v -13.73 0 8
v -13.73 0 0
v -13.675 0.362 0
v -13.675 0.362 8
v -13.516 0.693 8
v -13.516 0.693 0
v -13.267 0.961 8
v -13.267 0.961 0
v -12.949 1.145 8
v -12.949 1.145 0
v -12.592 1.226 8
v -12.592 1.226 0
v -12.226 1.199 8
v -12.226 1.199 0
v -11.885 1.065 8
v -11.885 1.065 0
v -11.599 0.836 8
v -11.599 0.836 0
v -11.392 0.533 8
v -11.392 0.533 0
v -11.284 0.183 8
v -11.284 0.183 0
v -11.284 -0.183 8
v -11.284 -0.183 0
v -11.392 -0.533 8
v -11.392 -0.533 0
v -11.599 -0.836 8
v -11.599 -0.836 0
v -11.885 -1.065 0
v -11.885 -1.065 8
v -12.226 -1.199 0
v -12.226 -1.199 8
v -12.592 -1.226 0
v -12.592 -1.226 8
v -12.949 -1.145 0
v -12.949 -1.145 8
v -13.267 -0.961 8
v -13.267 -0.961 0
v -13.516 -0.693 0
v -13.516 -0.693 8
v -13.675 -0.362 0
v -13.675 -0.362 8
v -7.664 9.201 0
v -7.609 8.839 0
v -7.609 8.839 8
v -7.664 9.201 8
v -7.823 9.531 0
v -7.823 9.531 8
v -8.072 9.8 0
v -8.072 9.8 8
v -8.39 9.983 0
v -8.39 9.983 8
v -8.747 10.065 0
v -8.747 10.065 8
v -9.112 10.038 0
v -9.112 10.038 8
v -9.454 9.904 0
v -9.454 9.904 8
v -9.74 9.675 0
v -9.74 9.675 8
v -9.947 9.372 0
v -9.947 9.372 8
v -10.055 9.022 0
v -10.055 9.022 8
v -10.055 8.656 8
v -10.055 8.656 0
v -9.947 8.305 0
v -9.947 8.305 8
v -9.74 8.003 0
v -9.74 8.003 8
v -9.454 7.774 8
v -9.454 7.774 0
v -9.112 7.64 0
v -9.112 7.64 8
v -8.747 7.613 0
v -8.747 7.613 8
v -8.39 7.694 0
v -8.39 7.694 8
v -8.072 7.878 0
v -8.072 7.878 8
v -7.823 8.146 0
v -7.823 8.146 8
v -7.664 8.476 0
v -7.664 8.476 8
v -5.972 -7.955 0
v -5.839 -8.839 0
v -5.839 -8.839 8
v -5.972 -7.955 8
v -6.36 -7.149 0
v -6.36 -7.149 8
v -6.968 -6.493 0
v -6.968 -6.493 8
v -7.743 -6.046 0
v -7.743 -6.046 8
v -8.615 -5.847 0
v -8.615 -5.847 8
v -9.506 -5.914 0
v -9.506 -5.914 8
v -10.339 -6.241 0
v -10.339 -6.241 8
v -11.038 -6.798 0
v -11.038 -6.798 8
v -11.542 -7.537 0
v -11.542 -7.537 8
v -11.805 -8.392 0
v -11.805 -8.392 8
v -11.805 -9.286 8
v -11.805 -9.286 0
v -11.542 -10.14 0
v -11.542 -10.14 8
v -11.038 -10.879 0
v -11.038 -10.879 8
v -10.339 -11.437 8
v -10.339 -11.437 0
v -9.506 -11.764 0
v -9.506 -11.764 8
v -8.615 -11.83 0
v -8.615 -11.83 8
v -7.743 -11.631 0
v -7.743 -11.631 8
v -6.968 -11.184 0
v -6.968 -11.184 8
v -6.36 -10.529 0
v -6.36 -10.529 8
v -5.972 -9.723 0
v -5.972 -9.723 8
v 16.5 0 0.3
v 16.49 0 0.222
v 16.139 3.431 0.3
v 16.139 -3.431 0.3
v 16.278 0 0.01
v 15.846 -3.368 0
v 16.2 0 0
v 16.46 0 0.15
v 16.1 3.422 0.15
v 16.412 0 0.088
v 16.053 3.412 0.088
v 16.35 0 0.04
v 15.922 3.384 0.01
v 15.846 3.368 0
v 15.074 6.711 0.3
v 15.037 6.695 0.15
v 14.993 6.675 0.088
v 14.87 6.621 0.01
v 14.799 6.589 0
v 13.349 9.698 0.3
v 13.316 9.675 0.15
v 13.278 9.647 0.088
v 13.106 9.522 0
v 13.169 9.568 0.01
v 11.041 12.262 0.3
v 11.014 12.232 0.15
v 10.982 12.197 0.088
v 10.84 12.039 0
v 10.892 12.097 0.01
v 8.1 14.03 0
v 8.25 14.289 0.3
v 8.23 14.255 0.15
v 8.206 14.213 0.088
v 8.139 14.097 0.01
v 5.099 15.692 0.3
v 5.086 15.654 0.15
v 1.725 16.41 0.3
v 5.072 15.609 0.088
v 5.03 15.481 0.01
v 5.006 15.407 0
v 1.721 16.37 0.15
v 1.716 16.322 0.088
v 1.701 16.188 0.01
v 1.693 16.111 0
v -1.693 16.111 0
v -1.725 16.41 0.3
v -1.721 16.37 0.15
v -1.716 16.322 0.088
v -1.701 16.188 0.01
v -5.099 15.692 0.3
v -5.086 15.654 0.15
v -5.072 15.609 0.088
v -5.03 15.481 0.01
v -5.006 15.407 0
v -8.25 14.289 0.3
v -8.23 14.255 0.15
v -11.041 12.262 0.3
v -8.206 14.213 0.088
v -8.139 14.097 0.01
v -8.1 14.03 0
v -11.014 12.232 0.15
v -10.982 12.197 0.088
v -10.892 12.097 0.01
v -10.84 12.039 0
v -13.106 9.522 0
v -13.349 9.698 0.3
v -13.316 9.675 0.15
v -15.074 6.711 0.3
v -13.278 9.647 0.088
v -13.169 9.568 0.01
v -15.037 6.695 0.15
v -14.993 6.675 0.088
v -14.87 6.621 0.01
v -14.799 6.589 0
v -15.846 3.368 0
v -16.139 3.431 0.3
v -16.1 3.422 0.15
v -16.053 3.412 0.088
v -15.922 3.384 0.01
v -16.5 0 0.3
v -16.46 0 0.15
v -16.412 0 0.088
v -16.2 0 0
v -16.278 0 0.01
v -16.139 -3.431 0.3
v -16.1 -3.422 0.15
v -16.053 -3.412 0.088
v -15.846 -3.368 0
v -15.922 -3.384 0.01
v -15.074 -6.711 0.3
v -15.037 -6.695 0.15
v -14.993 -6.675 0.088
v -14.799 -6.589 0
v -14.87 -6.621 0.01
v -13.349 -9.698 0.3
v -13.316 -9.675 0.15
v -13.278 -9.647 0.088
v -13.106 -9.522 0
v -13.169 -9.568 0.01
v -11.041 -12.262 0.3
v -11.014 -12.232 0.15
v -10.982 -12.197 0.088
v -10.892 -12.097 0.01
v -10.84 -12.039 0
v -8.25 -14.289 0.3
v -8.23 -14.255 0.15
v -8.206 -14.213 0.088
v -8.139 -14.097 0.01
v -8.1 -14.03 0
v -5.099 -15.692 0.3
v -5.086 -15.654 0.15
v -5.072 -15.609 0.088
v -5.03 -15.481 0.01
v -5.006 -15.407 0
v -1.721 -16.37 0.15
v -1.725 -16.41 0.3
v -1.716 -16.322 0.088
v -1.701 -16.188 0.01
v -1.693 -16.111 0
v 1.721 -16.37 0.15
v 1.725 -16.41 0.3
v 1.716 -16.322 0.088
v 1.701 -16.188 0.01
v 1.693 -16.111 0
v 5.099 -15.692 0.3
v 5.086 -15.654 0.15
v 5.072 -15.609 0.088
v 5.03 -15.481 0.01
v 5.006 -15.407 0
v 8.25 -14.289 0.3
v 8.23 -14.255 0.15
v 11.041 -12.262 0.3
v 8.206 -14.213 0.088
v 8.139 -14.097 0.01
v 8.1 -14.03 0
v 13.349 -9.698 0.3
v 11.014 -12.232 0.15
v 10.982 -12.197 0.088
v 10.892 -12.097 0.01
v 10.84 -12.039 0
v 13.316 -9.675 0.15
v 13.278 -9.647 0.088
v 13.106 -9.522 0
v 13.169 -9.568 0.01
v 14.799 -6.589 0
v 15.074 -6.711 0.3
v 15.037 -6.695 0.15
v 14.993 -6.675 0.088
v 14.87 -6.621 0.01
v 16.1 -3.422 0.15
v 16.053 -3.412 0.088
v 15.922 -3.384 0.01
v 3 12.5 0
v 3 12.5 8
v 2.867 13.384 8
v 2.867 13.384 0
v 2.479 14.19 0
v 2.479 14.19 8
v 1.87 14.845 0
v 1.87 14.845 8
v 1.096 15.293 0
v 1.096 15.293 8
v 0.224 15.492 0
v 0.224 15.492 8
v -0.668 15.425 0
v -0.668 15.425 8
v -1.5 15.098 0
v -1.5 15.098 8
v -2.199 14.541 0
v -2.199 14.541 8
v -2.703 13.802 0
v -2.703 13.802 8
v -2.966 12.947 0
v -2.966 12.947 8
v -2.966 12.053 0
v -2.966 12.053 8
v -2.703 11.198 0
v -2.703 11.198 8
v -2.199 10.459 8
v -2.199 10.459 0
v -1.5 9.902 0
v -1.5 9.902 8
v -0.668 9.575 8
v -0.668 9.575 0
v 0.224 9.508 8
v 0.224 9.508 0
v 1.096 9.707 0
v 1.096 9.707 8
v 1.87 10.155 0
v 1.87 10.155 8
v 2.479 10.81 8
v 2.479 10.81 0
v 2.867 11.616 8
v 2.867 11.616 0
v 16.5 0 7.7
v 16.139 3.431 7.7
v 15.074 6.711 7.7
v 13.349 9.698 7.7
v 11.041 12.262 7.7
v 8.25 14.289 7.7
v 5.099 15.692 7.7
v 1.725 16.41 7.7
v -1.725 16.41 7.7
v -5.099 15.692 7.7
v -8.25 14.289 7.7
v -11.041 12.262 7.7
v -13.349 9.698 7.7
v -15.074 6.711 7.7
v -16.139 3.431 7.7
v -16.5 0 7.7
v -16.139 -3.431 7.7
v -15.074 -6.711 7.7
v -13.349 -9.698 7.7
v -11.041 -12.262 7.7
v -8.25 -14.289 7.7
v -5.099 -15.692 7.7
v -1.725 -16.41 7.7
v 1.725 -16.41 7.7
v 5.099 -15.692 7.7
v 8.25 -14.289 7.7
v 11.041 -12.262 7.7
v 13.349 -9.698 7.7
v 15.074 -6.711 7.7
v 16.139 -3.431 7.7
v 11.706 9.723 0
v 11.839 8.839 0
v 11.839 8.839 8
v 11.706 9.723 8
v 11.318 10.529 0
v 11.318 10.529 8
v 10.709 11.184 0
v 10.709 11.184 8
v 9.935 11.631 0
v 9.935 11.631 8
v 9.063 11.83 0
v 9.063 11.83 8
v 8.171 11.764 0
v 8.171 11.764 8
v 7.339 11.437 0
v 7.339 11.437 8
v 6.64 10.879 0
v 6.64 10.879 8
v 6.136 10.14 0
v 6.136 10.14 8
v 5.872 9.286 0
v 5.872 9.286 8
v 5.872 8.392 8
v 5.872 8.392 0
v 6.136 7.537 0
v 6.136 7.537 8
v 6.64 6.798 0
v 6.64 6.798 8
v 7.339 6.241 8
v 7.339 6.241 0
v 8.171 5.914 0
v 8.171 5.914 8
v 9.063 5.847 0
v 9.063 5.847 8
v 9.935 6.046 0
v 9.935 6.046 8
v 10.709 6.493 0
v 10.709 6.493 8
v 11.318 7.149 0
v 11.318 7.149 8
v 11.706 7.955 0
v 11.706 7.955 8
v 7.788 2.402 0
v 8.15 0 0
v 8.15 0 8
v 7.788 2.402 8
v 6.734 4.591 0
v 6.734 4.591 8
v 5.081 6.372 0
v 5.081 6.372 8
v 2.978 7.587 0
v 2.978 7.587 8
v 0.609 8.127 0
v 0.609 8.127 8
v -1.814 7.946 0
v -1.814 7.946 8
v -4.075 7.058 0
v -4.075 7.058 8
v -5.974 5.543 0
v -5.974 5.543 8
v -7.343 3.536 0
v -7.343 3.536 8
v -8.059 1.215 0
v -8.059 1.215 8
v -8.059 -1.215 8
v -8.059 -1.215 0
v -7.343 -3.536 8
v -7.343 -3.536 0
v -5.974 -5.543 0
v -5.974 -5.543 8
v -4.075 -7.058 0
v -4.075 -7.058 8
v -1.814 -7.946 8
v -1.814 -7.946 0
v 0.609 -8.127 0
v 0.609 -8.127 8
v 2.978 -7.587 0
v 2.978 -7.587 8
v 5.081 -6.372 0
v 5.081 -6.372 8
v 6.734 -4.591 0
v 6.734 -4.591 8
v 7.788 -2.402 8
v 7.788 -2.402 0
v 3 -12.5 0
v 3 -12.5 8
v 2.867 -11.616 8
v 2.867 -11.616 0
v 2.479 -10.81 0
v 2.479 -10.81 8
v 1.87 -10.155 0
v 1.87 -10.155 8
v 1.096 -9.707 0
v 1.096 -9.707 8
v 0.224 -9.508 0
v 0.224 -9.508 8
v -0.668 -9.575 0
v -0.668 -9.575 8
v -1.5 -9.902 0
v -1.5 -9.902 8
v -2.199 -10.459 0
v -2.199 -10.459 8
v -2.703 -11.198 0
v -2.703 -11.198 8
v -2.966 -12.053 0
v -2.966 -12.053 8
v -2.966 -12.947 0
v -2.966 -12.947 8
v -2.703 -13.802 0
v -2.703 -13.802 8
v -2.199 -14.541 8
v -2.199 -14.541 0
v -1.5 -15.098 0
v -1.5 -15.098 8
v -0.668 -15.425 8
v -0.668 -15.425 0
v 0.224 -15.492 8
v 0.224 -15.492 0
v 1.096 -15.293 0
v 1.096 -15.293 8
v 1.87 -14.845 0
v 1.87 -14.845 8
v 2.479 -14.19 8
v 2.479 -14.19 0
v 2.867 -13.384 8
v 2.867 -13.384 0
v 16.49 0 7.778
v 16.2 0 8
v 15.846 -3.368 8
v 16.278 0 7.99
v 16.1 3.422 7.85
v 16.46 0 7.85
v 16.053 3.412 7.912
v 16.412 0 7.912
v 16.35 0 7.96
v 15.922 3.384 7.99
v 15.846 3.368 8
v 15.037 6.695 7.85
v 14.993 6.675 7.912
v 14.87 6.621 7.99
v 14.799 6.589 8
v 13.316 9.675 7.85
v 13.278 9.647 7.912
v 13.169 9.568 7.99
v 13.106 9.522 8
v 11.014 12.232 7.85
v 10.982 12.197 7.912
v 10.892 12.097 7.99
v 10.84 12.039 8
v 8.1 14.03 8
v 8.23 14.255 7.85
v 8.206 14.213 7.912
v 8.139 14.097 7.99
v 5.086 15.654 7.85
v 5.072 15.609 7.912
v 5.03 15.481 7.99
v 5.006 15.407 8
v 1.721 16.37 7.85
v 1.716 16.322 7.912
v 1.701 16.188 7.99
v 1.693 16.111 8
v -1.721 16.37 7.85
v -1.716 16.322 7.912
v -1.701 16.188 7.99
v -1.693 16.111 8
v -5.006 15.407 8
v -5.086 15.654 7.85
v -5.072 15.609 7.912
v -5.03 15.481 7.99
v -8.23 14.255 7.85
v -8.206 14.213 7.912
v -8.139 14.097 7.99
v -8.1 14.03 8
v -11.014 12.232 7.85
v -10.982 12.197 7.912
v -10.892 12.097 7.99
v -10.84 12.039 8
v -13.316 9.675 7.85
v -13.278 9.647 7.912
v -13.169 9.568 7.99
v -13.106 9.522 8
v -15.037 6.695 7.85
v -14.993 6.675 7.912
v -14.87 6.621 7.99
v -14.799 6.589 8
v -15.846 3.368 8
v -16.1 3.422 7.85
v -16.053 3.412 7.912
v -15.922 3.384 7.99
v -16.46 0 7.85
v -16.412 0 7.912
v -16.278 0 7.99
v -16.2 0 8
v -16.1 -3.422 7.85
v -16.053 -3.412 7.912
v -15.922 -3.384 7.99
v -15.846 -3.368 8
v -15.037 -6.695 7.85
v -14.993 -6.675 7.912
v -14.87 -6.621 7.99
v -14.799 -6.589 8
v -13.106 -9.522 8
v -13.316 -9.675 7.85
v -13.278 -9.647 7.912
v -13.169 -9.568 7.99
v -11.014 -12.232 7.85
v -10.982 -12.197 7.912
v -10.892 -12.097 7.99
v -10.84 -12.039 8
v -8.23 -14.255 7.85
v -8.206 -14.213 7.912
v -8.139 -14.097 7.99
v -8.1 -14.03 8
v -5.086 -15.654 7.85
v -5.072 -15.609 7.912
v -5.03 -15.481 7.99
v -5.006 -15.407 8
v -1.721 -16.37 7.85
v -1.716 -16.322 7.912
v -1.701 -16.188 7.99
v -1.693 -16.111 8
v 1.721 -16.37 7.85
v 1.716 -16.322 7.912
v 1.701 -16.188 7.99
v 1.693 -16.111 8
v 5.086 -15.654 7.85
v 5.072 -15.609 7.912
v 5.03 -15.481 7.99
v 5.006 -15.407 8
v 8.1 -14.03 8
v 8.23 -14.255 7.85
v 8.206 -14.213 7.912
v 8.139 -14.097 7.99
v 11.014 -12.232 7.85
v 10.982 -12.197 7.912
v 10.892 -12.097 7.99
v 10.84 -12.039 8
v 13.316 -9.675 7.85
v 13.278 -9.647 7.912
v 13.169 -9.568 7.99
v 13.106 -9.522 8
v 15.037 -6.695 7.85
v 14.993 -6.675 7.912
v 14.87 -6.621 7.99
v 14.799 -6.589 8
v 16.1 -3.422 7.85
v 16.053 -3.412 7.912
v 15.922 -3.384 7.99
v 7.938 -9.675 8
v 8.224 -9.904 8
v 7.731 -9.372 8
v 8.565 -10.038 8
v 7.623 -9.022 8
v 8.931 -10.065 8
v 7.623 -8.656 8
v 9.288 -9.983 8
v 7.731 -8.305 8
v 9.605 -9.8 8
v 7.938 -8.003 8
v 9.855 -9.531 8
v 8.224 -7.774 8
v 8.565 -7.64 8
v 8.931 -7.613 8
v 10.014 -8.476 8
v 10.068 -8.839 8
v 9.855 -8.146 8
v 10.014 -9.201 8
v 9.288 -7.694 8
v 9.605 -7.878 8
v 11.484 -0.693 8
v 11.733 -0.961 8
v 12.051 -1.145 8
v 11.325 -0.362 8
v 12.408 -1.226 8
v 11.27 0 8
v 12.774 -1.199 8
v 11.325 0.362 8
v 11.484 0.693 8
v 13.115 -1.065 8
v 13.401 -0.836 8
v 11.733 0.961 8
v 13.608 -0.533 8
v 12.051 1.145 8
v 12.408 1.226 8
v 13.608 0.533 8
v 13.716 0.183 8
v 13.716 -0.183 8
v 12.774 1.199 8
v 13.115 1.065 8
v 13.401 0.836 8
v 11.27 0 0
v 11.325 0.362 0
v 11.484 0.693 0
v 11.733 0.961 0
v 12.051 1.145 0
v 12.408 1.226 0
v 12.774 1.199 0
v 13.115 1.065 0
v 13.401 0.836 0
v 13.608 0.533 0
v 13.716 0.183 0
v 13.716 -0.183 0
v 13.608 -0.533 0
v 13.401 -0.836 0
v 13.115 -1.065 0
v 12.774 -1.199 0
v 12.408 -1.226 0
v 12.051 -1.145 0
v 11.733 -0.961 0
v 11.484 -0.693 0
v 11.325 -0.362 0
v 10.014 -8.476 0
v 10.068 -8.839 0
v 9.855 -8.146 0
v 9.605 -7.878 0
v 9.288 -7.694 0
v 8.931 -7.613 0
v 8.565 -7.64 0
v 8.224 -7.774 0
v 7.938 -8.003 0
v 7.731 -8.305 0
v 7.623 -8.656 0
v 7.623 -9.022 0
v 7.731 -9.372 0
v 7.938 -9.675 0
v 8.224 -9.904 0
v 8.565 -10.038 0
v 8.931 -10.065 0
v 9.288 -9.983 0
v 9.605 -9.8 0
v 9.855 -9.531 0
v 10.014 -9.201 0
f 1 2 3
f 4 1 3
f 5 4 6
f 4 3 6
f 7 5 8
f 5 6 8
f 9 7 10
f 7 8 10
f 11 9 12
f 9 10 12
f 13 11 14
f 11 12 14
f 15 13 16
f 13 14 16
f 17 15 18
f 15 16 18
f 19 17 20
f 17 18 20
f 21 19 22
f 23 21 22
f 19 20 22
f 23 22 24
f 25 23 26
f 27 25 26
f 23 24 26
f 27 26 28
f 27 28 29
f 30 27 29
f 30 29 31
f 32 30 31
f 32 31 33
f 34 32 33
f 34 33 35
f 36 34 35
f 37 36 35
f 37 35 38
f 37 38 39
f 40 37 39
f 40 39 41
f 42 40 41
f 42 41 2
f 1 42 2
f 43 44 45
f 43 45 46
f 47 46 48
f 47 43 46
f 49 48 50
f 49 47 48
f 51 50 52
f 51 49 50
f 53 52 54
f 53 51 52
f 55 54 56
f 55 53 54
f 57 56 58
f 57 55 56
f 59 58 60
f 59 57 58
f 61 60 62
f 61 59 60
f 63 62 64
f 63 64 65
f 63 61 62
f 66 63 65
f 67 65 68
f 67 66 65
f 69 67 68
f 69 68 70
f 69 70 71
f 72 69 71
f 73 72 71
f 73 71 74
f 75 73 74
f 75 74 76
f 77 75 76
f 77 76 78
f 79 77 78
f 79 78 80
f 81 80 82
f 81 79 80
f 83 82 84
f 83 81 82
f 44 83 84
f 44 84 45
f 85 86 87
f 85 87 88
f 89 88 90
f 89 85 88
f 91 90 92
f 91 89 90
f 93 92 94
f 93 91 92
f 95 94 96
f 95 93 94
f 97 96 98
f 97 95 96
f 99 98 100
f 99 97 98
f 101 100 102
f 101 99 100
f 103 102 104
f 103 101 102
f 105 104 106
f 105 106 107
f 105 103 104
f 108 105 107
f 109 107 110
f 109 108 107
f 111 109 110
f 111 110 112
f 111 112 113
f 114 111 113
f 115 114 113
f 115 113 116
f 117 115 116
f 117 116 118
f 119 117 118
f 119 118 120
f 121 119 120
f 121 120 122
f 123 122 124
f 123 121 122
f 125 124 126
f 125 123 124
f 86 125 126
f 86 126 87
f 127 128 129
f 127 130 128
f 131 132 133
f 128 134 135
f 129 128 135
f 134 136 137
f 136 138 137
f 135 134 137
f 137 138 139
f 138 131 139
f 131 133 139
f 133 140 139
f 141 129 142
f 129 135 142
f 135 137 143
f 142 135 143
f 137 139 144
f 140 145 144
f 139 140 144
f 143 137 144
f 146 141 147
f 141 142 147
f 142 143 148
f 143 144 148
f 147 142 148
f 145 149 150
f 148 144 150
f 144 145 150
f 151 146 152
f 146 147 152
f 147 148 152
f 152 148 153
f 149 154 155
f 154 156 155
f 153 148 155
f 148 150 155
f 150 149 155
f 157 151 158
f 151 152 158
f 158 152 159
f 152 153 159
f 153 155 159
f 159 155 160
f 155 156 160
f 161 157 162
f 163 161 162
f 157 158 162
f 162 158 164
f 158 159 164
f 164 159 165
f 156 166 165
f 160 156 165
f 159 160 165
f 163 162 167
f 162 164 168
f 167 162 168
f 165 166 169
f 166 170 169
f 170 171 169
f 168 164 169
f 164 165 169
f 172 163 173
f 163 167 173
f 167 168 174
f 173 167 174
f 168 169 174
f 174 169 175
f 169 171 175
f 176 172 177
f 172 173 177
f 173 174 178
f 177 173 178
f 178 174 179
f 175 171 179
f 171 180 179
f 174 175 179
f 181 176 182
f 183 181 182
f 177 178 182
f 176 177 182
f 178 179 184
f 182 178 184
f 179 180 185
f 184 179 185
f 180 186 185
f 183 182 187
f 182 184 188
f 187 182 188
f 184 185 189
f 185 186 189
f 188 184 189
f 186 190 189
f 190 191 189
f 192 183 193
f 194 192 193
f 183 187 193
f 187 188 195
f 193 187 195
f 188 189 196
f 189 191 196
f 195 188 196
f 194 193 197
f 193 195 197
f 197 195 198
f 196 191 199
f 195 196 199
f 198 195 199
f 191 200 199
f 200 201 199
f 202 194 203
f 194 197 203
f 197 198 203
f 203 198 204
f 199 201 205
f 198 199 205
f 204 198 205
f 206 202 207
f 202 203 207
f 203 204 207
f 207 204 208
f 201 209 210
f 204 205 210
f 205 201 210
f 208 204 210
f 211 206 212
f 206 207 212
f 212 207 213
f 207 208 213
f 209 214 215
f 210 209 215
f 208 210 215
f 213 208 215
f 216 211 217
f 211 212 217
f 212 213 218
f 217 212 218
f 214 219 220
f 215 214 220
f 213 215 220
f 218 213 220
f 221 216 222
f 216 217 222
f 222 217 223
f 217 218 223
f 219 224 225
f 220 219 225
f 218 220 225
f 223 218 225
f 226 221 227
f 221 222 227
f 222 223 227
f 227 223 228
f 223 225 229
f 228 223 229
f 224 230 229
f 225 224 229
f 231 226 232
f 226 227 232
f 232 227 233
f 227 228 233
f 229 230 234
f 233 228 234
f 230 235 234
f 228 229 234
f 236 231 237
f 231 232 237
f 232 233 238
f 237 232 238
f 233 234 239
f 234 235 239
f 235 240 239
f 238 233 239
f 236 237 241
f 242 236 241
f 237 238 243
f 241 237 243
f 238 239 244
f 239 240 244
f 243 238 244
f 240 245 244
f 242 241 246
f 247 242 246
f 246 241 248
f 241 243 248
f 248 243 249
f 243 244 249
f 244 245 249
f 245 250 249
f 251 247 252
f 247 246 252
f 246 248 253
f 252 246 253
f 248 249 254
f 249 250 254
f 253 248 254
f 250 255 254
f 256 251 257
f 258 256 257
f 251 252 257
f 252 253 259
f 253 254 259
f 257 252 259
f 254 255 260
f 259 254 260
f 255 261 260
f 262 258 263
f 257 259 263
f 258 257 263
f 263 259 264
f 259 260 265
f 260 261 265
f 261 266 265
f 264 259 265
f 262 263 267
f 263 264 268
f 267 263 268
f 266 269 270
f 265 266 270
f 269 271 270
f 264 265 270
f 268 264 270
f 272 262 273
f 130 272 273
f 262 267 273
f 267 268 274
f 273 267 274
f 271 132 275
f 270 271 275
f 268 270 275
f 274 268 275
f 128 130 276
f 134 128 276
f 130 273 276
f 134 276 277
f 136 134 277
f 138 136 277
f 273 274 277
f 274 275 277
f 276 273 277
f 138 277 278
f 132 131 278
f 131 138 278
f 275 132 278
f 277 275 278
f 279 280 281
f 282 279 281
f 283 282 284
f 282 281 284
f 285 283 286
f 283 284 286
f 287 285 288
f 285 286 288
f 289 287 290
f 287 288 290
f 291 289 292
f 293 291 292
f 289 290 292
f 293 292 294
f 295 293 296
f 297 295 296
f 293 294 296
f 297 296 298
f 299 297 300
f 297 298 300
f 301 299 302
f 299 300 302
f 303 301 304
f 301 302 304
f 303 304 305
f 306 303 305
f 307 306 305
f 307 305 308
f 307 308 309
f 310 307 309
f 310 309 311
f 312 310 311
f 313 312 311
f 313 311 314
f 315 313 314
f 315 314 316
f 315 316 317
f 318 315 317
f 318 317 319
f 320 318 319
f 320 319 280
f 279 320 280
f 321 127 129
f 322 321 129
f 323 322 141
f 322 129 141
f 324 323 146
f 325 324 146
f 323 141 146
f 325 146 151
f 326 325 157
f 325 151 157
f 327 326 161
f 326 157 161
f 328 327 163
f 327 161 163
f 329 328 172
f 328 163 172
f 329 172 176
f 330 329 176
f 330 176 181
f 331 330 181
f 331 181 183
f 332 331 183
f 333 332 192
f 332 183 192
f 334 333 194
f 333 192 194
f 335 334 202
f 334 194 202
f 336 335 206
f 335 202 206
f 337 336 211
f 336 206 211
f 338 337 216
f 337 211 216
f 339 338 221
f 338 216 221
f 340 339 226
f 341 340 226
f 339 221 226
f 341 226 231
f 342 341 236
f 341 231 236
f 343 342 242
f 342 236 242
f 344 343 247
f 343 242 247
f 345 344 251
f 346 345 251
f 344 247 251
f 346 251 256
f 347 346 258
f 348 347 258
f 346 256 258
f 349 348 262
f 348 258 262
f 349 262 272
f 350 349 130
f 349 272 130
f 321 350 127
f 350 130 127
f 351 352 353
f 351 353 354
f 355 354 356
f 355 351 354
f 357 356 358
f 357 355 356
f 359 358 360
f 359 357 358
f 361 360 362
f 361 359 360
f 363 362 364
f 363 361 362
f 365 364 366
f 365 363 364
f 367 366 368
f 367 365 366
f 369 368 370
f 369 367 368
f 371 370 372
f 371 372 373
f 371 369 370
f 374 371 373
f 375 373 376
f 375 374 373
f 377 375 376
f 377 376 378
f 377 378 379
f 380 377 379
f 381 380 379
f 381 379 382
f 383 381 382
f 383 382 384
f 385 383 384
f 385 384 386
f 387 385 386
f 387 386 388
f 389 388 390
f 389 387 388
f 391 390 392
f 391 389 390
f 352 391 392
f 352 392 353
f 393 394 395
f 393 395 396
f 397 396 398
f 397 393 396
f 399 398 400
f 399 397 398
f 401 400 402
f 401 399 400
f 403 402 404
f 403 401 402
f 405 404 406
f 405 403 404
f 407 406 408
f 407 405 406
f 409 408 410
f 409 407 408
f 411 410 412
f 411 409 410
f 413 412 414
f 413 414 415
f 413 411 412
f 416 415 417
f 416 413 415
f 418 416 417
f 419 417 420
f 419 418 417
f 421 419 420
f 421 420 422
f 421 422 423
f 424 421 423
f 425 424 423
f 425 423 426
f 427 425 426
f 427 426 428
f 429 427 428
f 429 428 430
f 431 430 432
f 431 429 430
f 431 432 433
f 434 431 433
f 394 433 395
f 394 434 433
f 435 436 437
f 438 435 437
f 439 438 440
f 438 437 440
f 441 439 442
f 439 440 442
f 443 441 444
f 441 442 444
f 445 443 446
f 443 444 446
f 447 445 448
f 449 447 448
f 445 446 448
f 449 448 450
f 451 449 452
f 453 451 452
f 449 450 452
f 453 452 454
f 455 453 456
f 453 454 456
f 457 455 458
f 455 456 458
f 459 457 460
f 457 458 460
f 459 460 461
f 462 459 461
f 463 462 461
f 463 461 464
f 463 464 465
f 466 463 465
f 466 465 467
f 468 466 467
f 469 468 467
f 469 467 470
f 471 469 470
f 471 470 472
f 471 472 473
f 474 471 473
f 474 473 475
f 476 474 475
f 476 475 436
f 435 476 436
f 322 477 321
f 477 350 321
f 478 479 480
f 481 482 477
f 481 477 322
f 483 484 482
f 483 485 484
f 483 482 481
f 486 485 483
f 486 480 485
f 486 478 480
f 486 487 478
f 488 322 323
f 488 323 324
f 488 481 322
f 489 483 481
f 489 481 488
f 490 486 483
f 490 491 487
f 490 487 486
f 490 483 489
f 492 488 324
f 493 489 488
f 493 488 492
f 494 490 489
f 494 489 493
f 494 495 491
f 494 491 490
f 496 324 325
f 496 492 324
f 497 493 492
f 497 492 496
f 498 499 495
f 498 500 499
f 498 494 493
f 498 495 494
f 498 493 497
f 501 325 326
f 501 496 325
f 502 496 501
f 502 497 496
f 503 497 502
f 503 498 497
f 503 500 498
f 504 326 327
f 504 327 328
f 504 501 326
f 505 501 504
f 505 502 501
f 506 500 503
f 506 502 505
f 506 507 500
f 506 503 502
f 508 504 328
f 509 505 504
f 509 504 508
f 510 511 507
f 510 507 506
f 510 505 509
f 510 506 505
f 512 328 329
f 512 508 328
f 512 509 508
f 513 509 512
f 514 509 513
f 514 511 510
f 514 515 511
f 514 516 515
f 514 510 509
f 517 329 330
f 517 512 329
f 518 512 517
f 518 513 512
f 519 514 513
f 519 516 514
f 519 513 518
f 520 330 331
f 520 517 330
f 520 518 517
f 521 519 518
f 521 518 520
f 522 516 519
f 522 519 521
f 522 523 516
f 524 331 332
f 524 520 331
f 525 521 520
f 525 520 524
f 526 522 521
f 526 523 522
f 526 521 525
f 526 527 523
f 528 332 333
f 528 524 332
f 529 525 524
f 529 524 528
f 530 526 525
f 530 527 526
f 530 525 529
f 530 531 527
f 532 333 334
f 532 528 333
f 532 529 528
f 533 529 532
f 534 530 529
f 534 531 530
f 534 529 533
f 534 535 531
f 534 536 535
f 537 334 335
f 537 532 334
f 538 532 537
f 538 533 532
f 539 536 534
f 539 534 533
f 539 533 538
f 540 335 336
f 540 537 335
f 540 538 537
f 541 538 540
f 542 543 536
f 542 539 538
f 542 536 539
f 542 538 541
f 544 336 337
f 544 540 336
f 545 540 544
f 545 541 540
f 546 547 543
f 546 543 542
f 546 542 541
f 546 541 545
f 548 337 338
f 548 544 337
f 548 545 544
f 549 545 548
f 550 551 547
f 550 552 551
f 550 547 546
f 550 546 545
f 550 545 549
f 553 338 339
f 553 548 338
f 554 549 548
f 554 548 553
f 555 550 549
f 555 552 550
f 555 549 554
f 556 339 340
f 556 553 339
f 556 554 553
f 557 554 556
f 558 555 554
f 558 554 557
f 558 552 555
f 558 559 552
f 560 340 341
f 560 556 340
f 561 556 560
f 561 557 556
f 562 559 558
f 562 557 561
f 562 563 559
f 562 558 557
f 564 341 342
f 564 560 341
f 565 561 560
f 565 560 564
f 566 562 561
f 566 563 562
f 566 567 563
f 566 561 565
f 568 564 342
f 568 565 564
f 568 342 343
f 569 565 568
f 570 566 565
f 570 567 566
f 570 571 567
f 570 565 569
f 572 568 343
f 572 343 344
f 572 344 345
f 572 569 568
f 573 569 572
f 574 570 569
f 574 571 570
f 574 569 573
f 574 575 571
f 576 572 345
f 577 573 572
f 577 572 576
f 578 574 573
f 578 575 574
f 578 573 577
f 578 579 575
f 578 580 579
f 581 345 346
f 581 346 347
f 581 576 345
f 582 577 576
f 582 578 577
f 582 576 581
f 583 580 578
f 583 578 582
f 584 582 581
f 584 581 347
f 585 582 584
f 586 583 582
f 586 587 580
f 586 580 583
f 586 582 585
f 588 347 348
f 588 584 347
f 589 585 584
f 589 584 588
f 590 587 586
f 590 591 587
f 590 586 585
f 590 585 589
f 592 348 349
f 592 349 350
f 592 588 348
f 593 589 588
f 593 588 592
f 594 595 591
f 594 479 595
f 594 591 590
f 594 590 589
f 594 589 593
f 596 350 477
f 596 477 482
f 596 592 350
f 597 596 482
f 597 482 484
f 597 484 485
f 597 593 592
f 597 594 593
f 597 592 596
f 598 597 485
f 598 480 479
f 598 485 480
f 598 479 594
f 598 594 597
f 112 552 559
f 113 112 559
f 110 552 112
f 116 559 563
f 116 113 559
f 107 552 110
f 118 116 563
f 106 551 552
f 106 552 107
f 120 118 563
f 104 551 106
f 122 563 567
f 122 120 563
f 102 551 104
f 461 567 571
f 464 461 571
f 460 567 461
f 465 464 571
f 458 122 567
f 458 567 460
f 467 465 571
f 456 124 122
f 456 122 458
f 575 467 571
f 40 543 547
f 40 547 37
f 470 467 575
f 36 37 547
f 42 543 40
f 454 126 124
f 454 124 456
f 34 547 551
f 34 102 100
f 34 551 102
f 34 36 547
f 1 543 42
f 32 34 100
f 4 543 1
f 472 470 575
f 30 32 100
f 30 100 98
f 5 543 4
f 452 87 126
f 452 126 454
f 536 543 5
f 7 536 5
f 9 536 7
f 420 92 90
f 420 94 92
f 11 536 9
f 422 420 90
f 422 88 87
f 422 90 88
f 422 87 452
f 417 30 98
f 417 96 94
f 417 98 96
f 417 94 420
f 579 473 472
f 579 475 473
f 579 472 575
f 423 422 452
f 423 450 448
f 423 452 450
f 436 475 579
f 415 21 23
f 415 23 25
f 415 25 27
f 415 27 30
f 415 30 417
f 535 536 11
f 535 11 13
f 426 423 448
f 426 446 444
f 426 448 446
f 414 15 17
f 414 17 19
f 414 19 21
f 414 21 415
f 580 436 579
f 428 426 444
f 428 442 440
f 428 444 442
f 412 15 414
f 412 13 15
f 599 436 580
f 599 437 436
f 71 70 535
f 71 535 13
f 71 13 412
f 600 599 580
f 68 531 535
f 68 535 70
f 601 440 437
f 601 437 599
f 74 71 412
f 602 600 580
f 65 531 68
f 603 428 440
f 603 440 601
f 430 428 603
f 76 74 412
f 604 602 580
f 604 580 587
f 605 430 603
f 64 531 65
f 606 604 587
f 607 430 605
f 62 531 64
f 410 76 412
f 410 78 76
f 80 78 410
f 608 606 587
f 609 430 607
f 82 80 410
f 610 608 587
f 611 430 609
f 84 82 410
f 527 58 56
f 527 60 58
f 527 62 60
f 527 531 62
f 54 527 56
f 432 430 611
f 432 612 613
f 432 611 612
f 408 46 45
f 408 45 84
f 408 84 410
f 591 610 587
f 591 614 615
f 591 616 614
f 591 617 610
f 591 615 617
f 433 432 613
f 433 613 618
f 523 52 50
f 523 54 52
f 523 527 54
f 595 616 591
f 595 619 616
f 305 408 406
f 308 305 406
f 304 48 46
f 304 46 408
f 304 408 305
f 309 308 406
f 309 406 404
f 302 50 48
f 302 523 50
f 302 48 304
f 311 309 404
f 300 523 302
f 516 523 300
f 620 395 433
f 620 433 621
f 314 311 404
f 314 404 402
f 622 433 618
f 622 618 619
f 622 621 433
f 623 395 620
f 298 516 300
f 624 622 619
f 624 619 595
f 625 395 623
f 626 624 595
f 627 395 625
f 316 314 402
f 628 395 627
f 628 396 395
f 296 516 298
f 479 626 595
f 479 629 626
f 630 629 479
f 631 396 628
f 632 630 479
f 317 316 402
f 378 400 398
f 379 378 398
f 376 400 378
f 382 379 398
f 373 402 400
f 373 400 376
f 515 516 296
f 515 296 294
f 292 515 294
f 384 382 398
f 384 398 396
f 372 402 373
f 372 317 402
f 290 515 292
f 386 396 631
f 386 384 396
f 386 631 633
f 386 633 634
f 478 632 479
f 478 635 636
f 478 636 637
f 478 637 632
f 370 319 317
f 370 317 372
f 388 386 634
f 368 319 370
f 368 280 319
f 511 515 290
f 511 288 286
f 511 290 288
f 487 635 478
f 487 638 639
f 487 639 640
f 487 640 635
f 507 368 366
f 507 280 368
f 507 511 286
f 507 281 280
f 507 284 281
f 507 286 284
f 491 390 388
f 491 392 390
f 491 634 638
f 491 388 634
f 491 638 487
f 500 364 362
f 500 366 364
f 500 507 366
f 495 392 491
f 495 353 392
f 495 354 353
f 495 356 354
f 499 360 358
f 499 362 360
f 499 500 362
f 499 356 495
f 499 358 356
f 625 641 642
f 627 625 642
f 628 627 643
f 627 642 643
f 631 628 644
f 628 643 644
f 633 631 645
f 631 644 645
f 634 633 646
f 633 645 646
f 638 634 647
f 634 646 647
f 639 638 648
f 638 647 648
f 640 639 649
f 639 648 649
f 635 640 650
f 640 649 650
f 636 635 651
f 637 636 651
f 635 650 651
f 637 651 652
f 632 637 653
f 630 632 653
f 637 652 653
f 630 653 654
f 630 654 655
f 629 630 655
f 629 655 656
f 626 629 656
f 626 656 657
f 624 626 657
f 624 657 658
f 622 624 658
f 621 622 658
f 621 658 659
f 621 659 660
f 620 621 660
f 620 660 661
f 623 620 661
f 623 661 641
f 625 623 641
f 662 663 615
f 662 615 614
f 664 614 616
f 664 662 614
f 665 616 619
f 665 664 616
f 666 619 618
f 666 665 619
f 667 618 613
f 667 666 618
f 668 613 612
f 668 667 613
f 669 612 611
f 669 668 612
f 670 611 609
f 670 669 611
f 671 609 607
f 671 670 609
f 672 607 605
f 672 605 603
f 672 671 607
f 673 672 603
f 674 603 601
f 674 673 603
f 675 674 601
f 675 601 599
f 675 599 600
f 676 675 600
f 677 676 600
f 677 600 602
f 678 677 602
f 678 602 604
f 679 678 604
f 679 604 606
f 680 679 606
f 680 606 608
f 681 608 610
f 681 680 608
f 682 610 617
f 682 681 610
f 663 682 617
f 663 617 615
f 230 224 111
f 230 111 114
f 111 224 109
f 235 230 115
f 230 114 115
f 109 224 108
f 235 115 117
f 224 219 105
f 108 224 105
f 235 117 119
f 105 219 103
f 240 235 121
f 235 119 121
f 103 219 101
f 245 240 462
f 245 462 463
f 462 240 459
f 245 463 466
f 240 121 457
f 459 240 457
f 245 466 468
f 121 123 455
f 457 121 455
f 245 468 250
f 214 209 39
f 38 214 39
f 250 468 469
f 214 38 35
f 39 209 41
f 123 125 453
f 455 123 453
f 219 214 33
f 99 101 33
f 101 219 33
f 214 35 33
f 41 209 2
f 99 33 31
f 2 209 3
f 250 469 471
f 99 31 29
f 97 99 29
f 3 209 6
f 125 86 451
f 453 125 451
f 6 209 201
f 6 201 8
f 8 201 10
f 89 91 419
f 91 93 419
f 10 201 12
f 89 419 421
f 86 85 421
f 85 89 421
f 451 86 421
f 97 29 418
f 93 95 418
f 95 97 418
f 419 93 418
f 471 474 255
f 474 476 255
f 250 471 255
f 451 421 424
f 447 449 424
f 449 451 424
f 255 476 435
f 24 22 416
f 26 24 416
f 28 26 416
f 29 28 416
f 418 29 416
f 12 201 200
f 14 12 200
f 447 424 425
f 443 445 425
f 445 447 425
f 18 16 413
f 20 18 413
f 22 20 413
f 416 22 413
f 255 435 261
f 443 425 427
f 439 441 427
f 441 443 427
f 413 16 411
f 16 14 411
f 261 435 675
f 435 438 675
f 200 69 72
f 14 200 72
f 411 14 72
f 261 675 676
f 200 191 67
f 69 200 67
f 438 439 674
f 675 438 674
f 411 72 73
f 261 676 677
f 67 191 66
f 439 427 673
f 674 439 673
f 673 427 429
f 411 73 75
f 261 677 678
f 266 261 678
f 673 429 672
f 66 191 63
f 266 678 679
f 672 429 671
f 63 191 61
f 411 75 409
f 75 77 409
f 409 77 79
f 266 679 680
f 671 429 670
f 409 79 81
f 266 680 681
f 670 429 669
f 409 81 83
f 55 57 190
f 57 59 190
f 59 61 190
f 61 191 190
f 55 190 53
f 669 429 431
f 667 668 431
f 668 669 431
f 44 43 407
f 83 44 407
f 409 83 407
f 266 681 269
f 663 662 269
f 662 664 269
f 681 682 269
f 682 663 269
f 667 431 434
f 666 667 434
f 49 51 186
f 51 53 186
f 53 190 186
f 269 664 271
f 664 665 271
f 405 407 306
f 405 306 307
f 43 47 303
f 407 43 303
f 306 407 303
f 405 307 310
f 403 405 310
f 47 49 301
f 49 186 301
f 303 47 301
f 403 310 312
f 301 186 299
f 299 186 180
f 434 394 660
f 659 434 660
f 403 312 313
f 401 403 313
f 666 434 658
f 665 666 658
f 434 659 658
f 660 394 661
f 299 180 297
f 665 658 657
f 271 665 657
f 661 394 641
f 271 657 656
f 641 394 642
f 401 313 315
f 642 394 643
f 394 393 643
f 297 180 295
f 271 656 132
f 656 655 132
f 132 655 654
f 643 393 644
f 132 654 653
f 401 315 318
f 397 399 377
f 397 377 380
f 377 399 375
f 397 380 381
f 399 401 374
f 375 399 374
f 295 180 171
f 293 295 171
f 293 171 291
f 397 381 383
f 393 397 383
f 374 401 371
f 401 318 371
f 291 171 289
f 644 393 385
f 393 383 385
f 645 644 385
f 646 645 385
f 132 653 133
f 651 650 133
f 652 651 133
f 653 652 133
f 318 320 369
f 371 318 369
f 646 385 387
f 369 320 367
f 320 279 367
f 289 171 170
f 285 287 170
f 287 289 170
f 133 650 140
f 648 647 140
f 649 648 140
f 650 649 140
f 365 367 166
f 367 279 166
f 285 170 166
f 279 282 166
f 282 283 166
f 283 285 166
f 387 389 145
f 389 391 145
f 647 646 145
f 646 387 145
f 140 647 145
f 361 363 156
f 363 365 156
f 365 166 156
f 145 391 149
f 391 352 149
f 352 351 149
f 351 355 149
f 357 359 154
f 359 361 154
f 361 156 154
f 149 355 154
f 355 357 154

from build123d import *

# Parameters (mm, degrees)
SKETCH1_R           = 16.5
SKETCH1_R_2         = 8.15
BOSS_EXTRUDE1_DEPTH = 8
SKETCH2_R           = 3
CUT_EXTRUDE1_DEPTH  = 25.667792767
TAP1_D              = 2.459
CIRPATTERN11_COUNT  = 2
CIRPATTERN11_ANGLE  = 45
FILLET1_R           = 0.3


with BuildPart() as part:
    # Sketch1 → Boss-Extrude1 (new body)
    with BuildSketch(Plane.XY):
        Circle(SKETCH1_R)
        Circle(SKETCH1_R_2, mode=Mode.SUBTRACT)
    extrude(amount=BOSS_EXTRUDE1_DEPTH)

    # Sketch2 → Cut-Extrude1 (cut, through all)
    with BuildSketch(Plane.XY.offset(8)):
        with Locations((0, 12.5)):
            Circle(SKETCH2_R)
        with Locations((0, -12.5)):
            Circle(SKETCH2_R)
    cut_extrude1 = extrude(amount=-CUT_EXTRUDE1_DEPTH, mode=Mode.SUBTRACT)

    # Tap1 (through all)
    with Locations(Plane.XY.offset(8)):
        with Locations((-12.5, 0), (12.5, 0)):
            tap1 = Hole(TAP1_D / 2)

    # CirPattern11: Cut-Extrude1, Tap1 ×2 about axis
    cirpattern11_axis = Axis((0, 0, -0.15), (0, 0, -1))
    add([cut_extrude1.rotate(cirpattern11_axis, i * CIRPATTERN11_ANGLE / (CIRPATTERN11_COUNT - 1)) for i in range(1, CIRPATTERN11_COUNT)], mode=Mode.SUBTRACT)
    add([tap1.rotate(cirpattern11_axis, i * CIRPATTERN11_ANGLE / (CIRPATTERN11_COUNT - 1)) for i in range(1, CIRPATTERN11_COUNT)], mode=Mode.SUBTRACT)

    # Fillet1
    fillet1_edges = [part.edges().sort_by_distance(p)[0] for p in [
        (-16.5, 0, 0),
        (-16.5, 0, 8),
    ]]
    fillet(fillet1_edges, radius=FILLET1_R)


solid = part.part
